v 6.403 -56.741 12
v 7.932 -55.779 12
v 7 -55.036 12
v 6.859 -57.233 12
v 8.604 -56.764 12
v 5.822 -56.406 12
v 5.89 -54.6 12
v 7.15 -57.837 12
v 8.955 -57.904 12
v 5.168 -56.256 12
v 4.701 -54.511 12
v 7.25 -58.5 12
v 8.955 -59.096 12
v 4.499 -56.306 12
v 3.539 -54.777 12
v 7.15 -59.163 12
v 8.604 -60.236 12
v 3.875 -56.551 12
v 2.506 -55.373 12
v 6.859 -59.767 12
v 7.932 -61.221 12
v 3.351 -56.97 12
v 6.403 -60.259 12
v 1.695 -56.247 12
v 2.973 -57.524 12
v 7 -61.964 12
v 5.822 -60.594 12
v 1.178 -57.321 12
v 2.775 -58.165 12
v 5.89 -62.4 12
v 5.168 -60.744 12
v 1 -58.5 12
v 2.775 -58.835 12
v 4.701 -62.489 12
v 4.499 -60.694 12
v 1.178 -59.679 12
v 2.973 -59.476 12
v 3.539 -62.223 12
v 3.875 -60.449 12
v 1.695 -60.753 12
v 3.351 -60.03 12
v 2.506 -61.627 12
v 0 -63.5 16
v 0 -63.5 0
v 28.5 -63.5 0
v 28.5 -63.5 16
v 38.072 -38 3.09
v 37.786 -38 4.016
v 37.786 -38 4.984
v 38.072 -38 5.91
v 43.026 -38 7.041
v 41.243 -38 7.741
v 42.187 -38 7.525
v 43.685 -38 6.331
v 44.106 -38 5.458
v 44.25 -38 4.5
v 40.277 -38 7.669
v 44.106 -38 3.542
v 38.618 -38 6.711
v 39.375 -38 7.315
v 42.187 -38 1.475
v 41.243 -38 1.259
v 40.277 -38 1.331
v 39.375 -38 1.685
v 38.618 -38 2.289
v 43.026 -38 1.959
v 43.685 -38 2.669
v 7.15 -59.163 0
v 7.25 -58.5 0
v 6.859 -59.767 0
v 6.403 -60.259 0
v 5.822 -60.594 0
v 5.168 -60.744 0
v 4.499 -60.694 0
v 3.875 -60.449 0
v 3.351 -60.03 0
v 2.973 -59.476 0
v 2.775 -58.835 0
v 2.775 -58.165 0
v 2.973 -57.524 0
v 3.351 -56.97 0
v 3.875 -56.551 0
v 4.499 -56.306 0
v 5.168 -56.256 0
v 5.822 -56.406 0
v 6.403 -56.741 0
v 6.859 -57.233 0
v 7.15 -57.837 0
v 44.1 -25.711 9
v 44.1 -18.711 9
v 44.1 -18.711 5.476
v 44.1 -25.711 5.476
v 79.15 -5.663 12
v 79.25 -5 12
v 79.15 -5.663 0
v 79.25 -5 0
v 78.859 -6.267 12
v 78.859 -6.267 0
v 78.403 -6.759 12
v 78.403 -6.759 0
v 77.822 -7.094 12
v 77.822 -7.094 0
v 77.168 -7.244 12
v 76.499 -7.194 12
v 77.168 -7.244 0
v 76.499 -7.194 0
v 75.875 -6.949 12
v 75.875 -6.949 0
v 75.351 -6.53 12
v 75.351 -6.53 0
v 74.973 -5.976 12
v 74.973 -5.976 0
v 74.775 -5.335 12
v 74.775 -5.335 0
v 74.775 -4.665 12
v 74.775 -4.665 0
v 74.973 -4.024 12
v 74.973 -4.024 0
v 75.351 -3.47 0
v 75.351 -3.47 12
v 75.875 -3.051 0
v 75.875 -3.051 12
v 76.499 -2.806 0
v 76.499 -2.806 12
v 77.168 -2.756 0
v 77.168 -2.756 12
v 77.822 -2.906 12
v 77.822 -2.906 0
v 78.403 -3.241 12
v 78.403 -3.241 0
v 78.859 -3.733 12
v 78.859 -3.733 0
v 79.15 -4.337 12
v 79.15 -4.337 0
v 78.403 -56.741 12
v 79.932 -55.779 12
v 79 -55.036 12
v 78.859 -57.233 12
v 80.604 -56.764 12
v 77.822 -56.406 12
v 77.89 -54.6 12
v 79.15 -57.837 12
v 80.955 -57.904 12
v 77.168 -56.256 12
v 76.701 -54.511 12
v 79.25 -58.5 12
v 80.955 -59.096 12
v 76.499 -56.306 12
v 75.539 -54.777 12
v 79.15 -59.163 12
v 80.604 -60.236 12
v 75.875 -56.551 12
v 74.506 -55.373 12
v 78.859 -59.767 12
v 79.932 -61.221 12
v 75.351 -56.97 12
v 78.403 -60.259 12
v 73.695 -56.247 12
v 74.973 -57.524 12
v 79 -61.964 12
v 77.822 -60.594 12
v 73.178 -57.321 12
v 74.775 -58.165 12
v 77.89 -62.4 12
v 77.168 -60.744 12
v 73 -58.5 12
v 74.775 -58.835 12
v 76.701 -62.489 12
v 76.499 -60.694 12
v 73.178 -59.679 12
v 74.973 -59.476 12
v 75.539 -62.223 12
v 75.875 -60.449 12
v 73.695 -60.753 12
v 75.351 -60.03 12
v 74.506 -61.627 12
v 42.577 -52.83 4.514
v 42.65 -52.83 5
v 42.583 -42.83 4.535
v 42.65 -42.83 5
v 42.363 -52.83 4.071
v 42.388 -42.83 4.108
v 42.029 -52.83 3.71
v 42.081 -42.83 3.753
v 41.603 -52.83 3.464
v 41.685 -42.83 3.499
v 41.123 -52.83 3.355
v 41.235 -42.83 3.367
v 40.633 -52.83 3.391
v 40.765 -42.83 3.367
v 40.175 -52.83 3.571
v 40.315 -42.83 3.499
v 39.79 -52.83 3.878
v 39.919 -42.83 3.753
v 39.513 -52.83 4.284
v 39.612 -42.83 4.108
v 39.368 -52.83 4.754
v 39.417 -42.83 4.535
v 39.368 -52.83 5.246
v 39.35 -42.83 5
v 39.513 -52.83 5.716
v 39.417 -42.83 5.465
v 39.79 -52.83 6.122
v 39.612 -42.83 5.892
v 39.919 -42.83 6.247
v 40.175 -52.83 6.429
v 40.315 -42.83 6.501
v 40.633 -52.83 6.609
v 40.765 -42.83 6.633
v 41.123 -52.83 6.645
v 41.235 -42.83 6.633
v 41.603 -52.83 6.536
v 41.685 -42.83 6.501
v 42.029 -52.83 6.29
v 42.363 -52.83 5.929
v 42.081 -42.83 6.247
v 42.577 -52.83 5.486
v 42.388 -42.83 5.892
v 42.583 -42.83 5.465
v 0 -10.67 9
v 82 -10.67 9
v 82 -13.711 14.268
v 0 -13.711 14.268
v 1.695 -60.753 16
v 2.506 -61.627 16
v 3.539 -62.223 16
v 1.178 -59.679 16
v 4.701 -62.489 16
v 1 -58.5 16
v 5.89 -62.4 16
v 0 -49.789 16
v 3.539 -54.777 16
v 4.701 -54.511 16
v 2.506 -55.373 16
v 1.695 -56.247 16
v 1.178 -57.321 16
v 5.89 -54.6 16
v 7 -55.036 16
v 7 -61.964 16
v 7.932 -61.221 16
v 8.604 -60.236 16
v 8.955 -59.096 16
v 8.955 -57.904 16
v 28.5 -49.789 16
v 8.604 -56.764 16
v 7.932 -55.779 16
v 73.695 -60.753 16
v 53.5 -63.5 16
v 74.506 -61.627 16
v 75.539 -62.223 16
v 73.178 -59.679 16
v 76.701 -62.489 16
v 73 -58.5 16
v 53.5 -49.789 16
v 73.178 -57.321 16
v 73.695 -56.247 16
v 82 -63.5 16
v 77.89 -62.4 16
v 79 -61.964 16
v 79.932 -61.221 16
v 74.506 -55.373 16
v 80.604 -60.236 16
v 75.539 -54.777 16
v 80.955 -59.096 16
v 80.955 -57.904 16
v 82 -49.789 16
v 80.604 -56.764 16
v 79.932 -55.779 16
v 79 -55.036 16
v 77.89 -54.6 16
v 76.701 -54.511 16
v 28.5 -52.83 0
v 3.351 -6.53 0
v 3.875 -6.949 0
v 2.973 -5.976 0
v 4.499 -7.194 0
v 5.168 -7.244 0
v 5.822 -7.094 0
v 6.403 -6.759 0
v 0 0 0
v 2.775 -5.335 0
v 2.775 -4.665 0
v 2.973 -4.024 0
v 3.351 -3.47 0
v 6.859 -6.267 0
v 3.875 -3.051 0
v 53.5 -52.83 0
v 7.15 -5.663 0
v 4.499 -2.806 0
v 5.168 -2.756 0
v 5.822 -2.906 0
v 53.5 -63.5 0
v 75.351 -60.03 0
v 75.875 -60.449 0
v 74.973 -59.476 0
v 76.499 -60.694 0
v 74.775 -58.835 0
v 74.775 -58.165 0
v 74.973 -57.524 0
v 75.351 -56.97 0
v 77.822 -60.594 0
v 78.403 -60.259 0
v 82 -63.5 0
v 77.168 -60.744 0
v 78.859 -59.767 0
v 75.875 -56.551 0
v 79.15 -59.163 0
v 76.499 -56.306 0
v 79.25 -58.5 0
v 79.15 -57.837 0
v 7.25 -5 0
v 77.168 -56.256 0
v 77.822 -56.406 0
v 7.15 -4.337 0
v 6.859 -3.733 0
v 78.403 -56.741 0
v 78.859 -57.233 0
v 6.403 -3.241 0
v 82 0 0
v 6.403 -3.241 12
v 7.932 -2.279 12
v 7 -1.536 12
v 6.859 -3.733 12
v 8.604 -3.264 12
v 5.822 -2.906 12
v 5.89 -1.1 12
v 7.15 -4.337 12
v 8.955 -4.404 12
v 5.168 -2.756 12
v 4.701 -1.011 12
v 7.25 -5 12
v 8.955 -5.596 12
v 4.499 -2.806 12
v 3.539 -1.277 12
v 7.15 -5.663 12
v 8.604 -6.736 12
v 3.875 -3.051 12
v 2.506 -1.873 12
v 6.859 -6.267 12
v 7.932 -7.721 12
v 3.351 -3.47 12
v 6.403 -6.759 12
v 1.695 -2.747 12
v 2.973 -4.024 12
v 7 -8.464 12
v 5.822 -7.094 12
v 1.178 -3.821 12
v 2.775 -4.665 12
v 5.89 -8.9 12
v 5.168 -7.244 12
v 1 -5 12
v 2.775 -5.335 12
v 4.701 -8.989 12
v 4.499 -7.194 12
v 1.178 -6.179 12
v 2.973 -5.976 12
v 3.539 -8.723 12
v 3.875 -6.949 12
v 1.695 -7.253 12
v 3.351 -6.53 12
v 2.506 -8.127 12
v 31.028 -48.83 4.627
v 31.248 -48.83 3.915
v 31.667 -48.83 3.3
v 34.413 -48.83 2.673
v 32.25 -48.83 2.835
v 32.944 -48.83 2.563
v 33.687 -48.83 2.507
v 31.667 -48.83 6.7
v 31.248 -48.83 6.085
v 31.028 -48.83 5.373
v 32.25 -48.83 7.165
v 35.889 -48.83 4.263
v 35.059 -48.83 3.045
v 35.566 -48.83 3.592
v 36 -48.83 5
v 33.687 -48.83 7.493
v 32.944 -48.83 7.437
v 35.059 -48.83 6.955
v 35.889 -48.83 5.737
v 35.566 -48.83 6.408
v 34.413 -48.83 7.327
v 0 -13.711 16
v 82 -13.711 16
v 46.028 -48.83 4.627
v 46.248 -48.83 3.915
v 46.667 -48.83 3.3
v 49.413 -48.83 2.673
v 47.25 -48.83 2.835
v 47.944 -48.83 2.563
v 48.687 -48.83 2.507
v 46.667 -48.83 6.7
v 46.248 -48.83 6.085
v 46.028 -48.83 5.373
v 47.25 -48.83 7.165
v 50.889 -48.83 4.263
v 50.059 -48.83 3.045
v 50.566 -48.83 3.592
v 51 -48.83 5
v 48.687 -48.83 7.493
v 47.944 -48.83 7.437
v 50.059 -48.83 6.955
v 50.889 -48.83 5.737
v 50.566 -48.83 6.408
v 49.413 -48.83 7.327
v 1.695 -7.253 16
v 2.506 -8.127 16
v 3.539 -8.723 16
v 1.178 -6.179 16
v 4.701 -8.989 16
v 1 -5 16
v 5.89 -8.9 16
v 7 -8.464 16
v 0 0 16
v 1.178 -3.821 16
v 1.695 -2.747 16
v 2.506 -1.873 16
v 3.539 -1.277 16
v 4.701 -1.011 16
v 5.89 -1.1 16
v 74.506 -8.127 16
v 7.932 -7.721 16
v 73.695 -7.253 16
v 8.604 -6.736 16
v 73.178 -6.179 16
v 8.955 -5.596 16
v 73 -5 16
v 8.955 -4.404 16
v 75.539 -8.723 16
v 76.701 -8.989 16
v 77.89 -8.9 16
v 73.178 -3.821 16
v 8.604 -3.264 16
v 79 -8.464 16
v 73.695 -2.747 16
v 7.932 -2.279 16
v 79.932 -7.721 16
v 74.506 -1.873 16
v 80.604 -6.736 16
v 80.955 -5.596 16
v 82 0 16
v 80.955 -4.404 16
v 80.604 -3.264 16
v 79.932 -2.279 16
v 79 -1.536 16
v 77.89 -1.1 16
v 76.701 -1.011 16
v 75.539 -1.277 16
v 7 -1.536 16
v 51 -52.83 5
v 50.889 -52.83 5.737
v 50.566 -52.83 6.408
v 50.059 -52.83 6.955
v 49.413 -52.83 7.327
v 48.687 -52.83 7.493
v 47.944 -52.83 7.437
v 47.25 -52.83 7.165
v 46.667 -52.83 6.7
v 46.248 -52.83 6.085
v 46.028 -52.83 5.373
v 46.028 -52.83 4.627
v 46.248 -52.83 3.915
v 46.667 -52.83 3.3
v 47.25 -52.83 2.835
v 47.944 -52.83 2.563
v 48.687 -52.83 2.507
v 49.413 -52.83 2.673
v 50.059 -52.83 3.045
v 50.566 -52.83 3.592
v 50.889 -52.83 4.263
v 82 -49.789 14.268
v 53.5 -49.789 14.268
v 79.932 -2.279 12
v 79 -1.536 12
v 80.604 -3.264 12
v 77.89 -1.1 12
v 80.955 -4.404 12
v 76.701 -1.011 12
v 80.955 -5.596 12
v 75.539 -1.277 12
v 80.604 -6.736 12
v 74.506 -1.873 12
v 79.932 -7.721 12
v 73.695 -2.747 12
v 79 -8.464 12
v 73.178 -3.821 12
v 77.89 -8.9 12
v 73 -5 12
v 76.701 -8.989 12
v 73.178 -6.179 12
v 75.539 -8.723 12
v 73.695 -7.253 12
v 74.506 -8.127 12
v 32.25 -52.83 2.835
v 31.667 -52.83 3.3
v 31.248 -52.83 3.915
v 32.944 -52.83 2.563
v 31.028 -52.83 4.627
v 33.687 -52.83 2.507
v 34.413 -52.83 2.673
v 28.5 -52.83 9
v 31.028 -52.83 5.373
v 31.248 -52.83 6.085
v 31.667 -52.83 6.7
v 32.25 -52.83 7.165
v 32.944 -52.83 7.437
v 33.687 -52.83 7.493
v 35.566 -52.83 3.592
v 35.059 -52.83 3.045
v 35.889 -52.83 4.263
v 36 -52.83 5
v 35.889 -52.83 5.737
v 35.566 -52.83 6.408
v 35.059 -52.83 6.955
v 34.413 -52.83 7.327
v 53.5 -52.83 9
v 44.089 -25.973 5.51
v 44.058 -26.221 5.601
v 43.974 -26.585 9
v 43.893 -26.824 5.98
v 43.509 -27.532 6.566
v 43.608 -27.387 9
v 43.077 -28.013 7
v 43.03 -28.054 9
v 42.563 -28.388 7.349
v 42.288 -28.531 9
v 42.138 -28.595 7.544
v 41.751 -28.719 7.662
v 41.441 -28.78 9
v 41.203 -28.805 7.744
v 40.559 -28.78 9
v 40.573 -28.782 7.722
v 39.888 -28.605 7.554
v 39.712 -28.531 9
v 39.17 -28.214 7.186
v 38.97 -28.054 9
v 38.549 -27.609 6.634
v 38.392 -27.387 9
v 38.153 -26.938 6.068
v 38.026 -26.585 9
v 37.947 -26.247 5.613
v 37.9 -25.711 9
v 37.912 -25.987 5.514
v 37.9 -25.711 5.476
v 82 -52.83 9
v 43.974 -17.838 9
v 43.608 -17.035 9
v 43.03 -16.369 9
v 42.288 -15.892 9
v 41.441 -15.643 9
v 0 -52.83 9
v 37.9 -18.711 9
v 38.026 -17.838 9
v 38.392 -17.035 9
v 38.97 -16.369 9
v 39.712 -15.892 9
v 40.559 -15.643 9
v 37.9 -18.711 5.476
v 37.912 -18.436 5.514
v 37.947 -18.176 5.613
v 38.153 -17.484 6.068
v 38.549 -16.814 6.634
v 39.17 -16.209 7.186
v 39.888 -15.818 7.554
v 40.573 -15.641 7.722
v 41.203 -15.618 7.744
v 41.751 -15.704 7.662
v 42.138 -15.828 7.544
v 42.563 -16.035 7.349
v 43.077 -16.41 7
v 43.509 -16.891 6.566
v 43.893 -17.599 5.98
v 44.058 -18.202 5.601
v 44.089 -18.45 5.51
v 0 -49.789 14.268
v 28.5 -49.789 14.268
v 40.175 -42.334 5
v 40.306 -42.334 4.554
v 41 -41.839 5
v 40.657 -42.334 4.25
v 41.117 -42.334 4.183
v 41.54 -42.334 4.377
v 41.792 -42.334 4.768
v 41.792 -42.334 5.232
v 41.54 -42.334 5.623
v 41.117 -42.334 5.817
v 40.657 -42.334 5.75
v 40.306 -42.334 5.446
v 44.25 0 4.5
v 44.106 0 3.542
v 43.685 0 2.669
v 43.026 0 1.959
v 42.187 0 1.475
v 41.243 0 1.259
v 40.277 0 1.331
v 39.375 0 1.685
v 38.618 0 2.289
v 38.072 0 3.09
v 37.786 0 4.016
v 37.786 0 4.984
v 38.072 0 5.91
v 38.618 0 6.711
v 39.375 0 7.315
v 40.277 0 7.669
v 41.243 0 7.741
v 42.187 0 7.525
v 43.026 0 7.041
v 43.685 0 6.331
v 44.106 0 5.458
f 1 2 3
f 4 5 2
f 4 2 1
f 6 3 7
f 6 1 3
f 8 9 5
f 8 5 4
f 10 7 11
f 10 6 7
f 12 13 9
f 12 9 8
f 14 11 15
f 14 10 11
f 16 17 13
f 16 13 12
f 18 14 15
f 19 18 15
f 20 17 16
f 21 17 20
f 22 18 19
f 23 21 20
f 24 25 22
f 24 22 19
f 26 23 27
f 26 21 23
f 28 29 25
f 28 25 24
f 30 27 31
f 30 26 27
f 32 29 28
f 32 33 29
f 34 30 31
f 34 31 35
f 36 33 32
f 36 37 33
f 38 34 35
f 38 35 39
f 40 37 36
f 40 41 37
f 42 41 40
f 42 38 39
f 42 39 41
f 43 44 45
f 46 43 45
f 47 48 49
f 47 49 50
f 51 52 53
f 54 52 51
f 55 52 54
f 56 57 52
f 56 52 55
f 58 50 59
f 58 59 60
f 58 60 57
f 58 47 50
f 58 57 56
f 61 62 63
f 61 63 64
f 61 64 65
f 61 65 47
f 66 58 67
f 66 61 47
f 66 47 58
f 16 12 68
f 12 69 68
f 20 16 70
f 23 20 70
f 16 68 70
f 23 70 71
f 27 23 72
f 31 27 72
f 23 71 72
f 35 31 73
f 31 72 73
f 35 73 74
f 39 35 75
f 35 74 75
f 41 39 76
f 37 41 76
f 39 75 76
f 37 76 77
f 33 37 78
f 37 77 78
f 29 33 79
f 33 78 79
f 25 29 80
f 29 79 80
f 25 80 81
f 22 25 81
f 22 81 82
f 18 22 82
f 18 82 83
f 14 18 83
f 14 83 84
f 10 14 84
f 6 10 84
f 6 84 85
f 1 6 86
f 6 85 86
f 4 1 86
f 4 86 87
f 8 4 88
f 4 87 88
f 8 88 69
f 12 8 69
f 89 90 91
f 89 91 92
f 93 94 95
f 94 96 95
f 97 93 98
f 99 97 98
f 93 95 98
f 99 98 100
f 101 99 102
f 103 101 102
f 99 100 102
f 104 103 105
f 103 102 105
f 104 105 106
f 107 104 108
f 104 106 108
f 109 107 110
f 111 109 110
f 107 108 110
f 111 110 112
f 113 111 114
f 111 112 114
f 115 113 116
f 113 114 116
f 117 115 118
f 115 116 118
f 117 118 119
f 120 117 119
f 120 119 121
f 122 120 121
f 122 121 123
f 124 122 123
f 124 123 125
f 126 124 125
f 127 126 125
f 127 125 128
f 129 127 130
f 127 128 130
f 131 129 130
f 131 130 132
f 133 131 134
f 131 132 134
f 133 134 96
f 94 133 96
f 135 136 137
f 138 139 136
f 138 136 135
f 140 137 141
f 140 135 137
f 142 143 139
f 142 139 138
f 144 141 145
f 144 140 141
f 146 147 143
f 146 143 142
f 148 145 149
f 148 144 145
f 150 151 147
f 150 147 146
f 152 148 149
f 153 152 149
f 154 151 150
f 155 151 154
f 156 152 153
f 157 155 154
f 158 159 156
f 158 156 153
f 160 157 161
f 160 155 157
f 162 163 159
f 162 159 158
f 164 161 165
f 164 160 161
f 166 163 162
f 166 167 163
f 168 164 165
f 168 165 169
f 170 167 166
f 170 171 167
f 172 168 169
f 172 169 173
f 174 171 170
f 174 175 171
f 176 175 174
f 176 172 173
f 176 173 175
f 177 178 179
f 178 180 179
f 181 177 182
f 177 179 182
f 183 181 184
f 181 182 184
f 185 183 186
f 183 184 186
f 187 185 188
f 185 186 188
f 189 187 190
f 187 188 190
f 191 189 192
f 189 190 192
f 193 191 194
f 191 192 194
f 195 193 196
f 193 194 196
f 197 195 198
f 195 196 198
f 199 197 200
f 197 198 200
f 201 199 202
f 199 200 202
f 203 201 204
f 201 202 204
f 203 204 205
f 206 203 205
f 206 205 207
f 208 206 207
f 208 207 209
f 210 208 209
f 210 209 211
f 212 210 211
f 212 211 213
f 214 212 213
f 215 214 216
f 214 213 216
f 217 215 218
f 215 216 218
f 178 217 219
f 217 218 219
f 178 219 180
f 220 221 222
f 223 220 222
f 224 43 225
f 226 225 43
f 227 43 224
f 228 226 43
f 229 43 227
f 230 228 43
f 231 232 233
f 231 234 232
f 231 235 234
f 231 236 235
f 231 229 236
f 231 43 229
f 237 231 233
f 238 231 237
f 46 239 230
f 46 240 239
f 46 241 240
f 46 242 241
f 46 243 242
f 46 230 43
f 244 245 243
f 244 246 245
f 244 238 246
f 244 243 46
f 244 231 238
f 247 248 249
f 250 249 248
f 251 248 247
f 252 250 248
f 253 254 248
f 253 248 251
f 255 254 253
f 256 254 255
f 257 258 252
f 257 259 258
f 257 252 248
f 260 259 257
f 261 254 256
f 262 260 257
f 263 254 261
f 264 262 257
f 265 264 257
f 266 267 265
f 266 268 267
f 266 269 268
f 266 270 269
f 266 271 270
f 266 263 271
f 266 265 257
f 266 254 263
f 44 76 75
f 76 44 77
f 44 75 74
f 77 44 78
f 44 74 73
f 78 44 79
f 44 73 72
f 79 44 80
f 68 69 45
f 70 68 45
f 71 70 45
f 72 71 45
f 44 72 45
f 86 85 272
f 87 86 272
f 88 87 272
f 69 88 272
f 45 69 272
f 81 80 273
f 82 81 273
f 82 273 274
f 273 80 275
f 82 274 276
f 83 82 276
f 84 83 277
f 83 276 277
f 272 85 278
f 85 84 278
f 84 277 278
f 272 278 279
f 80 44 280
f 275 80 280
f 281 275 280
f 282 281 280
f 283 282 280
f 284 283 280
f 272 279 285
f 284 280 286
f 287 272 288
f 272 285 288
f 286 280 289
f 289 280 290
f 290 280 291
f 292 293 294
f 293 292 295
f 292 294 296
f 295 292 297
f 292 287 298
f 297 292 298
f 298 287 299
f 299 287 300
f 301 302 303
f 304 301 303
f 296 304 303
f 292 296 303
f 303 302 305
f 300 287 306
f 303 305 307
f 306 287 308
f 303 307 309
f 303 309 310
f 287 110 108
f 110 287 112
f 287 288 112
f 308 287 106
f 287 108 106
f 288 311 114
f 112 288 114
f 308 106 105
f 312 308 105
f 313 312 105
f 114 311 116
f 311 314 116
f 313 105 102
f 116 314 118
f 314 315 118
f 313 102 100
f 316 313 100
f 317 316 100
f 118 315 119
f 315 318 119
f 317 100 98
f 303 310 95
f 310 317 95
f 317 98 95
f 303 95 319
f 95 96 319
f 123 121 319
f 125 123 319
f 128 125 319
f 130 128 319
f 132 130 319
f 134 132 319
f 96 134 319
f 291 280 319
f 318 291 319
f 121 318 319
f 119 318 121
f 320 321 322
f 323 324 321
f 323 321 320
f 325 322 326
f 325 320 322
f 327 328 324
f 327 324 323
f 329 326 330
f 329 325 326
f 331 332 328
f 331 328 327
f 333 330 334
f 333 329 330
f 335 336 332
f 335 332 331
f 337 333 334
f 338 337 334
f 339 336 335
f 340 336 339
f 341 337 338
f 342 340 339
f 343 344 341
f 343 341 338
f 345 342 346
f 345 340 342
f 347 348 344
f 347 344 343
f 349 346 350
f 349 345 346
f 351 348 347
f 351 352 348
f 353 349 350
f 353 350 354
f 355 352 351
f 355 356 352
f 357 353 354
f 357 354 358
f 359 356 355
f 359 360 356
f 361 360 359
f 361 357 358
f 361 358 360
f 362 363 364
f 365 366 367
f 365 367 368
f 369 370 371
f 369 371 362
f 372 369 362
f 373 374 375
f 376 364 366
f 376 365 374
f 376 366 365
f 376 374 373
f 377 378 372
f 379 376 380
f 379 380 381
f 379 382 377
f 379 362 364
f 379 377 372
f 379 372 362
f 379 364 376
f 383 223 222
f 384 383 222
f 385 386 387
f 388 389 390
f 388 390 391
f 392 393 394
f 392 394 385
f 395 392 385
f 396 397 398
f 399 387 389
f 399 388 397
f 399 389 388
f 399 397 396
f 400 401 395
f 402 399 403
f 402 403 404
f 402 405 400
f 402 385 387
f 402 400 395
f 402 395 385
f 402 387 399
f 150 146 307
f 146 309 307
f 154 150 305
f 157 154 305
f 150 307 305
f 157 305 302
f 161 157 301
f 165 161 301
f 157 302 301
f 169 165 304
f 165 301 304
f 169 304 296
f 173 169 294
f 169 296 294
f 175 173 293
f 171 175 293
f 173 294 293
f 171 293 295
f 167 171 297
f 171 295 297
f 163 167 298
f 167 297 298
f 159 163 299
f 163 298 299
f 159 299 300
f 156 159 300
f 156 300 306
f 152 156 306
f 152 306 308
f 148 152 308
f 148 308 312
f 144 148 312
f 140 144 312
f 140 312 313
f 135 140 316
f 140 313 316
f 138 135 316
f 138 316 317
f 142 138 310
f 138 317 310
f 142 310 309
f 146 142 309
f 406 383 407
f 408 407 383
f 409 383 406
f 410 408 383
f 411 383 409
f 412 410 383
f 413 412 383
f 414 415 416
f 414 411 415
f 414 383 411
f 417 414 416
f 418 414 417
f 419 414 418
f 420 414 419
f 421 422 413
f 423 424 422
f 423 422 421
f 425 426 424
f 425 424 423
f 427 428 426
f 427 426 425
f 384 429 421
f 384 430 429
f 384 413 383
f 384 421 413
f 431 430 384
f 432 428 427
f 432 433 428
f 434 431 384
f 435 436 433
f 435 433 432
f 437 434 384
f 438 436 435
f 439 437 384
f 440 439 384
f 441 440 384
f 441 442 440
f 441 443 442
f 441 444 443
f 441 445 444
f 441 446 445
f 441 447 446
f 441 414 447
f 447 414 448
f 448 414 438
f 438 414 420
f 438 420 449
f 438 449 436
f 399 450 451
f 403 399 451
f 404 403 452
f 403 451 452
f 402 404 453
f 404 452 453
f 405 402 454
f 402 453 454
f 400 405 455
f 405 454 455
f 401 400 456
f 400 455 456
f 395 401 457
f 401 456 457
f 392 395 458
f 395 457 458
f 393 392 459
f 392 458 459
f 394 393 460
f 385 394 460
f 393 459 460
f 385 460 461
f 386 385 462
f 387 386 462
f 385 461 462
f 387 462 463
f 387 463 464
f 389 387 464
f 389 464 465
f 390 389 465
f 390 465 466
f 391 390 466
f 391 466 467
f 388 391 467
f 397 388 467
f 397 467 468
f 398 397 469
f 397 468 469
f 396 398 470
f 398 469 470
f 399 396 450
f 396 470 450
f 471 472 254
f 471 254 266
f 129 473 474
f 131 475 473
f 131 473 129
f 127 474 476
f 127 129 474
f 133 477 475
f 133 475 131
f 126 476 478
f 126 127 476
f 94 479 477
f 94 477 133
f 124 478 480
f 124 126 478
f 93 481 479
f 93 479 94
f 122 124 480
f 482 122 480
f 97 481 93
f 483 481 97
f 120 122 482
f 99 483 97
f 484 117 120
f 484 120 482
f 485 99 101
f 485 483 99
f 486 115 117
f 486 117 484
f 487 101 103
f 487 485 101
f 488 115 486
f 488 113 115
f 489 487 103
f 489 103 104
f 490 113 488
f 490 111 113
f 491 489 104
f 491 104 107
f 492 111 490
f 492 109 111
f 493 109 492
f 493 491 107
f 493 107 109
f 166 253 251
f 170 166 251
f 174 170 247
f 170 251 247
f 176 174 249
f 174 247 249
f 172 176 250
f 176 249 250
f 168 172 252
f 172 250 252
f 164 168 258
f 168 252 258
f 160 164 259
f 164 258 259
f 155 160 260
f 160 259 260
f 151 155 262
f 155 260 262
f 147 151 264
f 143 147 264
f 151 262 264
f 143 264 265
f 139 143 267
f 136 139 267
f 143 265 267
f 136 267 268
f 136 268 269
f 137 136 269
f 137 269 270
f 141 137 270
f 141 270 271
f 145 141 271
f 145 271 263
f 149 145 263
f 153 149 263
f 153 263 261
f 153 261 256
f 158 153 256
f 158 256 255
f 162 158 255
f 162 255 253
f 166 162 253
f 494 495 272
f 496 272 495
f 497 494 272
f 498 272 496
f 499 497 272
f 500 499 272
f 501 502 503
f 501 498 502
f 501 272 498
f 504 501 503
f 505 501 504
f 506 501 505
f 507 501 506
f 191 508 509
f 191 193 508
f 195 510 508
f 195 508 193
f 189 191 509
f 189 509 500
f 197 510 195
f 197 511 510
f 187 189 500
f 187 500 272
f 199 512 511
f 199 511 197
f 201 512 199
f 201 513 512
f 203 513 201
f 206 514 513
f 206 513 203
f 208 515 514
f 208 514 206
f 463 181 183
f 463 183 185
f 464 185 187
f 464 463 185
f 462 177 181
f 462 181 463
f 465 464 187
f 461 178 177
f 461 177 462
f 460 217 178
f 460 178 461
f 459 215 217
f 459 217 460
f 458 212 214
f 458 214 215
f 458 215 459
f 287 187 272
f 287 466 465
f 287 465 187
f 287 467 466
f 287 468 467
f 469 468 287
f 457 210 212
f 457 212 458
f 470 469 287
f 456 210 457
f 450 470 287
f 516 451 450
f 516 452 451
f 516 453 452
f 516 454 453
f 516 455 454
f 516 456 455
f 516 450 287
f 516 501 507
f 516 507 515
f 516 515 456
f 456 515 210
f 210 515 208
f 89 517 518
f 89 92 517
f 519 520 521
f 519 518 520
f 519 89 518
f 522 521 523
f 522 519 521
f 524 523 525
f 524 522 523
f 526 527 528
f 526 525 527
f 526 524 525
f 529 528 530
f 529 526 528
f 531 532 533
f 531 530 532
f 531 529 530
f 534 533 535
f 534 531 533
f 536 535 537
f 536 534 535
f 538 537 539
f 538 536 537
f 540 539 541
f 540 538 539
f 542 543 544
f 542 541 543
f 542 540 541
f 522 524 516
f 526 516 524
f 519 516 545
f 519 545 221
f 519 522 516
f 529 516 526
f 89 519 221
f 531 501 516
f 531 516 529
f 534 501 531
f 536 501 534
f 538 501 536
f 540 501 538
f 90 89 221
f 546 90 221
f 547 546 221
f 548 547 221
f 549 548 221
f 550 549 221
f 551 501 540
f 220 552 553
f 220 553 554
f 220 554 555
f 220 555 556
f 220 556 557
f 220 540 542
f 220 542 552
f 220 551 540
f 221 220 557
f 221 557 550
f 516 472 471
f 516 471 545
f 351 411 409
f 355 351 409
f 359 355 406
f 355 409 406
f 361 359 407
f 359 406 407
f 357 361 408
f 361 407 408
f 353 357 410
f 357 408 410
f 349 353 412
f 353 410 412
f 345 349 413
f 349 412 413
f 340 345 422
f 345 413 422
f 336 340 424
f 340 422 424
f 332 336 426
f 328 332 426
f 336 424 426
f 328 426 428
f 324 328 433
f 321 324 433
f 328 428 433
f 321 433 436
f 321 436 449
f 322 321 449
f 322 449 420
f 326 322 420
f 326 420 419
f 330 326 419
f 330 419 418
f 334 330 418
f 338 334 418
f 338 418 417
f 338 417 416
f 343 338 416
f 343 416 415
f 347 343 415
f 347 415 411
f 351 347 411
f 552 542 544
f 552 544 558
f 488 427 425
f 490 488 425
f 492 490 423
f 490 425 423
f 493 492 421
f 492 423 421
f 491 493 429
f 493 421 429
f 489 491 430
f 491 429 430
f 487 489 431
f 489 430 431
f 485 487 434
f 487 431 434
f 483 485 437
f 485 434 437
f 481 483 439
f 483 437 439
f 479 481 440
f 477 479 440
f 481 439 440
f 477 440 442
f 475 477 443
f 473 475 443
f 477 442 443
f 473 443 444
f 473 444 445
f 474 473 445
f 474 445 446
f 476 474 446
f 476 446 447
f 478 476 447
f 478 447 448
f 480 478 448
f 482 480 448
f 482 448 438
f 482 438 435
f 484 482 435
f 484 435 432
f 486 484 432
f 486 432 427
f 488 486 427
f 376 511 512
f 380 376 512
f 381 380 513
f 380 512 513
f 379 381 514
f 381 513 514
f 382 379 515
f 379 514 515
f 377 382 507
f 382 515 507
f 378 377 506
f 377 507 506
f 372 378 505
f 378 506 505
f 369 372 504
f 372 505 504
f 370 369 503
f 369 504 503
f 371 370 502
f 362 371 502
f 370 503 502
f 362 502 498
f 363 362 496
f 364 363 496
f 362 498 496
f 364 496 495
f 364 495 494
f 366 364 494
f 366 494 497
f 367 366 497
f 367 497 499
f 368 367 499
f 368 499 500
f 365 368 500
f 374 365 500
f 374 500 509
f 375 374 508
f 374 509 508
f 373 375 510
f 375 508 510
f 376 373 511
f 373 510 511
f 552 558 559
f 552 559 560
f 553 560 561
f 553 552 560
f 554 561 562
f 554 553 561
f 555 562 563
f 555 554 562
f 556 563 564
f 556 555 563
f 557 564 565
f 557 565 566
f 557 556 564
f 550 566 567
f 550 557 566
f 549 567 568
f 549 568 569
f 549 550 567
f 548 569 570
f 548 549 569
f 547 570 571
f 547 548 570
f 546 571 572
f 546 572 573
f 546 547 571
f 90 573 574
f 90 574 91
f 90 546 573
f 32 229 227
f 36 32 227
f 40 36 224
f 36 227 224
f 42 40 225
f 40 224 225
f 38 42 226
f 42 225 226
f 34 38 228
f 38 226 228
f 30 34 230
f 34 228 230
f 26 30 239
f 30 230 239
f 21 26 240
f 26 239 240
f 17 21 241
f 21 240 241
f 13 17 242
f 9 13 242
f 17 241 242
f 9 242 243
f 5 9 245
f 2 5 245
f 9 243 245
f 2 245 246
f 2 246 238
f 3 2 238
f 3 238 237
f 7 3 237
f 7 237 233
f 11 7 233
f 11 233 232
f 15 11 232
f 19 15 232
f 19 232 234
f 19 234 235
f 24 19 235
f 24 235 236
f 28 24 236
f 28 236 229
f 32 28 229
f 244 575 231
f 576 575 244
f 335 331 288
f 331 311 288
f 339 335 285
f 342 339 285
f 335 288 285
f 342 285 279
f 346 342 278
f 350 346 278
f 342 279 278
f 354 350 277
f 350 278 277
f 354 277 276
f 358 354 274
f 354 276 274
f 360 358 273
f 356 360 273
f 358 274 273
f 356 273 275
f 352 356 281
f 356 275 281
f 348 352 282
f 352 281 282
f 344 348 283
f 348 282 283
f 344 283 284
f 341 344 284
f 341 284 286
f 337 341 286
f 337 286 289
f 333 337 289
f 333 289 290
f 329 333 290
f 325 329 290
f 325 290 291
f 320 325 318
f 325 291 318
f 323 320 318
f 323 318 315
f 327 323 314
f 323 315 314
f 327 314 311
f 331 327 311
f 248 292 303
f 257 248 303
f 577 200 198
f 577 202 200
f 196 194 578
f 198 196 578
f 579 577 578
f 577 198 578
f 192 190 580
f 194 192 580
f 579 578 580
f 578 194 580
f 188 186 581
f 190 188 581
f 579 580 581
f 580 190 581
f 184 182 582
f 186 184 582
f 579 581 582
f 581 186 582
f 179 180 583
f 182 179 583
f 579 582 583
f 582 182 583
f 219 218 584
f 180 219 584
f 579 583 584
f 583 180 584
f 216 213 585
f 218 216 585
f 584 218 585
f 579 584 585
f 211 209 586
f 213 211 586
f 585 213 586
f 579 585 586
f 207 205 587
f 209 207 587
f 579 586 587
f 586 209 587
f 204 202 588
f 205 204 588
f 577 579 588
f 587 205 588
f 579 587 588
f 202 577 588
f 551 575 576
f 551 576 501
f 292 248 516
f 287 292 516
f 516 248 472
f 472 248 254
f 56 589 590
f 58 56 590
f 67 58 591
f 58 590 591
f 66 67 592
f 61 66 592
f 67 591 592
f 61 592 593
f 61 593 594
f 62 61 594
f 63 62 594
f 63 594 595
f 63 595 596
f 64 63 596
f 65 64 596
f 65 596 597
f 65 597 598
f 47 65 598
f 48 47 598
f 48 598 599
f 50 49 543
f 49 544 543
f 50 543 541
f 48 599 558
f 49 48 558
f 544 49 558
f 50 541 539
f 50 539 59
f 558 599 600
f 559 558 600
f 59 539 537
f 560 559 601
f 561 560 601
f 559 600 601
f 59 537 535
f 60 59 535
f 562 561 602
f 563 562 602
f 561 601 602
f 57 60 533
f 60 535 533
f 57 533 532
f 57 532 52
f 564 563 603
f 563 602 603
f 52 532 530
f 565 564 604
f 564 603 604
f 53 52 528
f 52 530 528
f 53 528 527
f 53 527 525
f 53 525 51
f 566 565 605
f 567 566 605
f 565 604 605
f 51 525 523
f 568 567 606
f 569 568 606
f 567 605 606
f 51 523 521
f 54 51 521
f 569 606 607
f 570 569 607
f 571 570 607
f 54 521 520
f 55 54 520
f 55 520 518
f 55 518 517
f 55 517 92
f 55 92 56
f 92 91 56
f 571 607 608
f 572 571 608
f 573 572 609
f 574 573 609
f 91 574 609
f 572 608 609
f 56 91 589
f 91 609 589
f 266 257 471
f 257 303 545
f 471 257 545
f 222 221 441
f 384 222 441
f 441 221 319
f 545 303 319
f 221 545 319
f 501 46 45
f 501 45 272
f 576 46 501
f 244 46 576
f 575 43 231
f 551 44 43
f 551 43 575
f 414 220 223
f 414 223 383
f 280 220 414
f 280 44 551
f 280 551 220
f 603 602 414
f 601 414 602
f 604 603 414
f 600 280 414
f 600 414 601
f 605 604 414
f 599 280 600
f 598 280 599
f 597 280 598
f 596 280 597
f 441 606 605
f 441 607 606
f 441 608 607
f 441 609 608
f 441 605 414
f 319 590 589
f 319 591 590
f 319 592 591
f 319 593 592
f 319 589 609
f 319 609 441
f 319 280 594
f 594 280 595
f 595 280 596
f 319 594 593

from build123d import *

# Parameters (mm, degrees)
SKETCH_1_W                  = 82
SKETCH_1_H                  = 63.5
EXTRUDE_1_DEPTH             = 16
CUT_EXTRUDE_1_DEPTH         = 83
SKETCH_15_W                 = 25
SKETCH_15_H                 = 14.711451884
CUT_EXTRUDE_4_DEPTH         = 7
SKETCH_16_W                 = 25
SKETCH_16_H                 = 10.67
CUT_EXTRUDE_5_DEPTH         = 9
SKETCH_17_R                 = 2.5
CUT_EXTRUDE_6_DEPTH         = 4
M4X0_72_D                   = 3.3
M4X0_72_DEPTH               = 10
M4X0_72_TIP                 = 0.991420021
CUT_EXTRUDE_7_DEPTH         = 4
SKETCH_26_R                 = 3.25
CUT_EXTRUDE_8_DEPTH         = 38
HOLE_WIZARD_M41_D           = 4.5
HOLE_WIZARD_M41_CBORE_D     = 8
HOLE_WIZARD_M41_CBORE_DEPTH = 4
CHAMFER_2_SIZE              = 1
CHAMFER_2_SIZE2             = 2
CHAMFER_2_PART_2_SIZE       = 1
CHAMFER_2_PART_2_SIZE2      = 2
CHAMFER_2_PART_3_SIZE       = 1
CHAMFER_2_PART_3_SIZE2      = 2


with BuildPart() as part:
    # Эскиз1 → Бобышка-Вытянуть1 (new body)
    with BuildSketch(Plane.XY):
        with Locations((41, -31.75)):
            Rectangle(SKETCH_1_W, SKETCH_1_H)
    extrude(amount=EXTRUDE_1_DEPTH)

    # Эскиз2 → Вырез-Вытянуть1 (cut, through all)
    with BuildSketch(Plane.ZY):
        Polygon((9, -10.67), (16, -14.711451884), (16, -48.788548116), (9, -52.83), align=None)
    extrude(amount=-CUT_EXTRUDE_1_DEPTH, mode=Mode.SUBTRACT)

    # Эскиз15 → Вырез-Вытянуть4 (cut)
    with BuildSketch(Plane.XY.offset(16)):
        with Locations((41, -56.144274058)):
            Rectangle(SKETCH_15_W, SKETCH_15_H)
    extrude(amount=-CUT_EXTRUDE_4_DEPTH, mode=Mode.SUBTRACT)

    # Эскиз16 → Вырез-Вытянуть5 (cut)
    with BuildSketch(Plane.XY.offset(9)):
        with Locations((41, -58.165)):
            Rectangle(SKETCH_16_W, SKETCH_16_H)
    extrude(amount=-CUT_EXTRUDE_5_DEPTH, mode=Mode.SUBTRACT)

    # Эскиз17 → Вырез-Вытянуть6 (cut)
    with BuildSketch(Plane.XZ.offset(52.83)):
        with Locations((33.5, 5)):
            Circle(SKETCH_17_R)
        with Locations((48.5, 5)):
            Circle(SKETCH_17_R)
    extrude(amount=-CUT_EXTRUDE_6_DEPTH, mode=Mode.SUBTRACT)

    # Отверстие обработанное метчиком M4x0.72
    with Locations(Plane(origin=(0, -52.83, 0), x_dir=(-1, 0, 0), z_dir=(0, -1, 0))):
        with Locations((-41, -5)):
            Hole(M4X0_72_D / 2, depth=M4X0_72_DEPTH)
            with Locations((0, 0, -(M4X0_72_DEPTH + M4X0_72_TIP / 2))):  # 118° drill point
                Cone(0, M4X0_72_D / 2, M4X0_72_TIP, mode=Mode.SUBTRACT)

    # Эскиз25 → Вырез-Вытянуть7 (cut)
    with BuildSketch(Plane.XY.offset(9)):
        with BuildLine():
            Line((44.1, -18.711451884), (44.1, -25.711451884))
            ThreePointArc((44.1, -25.711451884), (41, -28.811451884), (37.9, -25.711451884))
            Line((37.9, -25.711451884), (37.9, -18.711451884))
            ThreePointArc((37.9, -18.711451884), (41, -15.611451884), (44.1, -18.711451884))
        make_face()
    extrude(amount=-CUT_EXTRUDE_7_DEPTH, mode=Mode.SUBTRACT)

    # Эскиз26 → Вырез-Вытянуть8 (cut)
    with BuildSketch(Plane(origin=(0, 0, 0), x_dir=(1, 0, 0), z_dir=(0, 1, 0))):
        with Locations((41, -4.5)):
            Circle(SKETCH_26_R)
    extrude(amount=-CUT_EXTRUDE_8_DEPTH, mode=Mode.SUBTRACT)

    # Цековка для винта с внутренним шестигранником M41 (through all)
    with Locations(Plane(origin=(30.759227947, 26.793365177, 16), x_dir=(-1, 0, 0), z_dir=(0, 0, 1))):
        with Locations((-46.240772053, 31.793365177), (-46.240772053, 85.293365177), (25.759227947, 85.293365177), (25.759227947, 31.793365177)):
            CounterBoreHole(HOLE_WIZARD_M41_D / 2, HOLE_WIZARD_M41_CBORE_D / 2, HOLE_WIZARD_M41_CBORE_DEPTH)

    # Фаска2
    chamfer_2_edges = [part.edges().sort_by_distance(p)[0] for p in [
        (41, -14.711451884, 16),
    ]]
    chamfer_2_side = [part.faces().sort_by_distance(p)[0] for p in [
        (41, -7.569889145, 16),
    ]]
    chamfer(chamfer_2_edges, length=CHAMFER_2_SIZE, length2=CHAMFER_2_SIZE2, reference=chamfer_2_side[0])

    # Фаска2 part 2
    chamfer_2_part_2_edges = [part.edges().sort_by_distance(p)[0] for p in [
        (67.75, -48.788548116, 16),
    ]]
    chamfer_2_part_2_side = [part.faces().sort_by_distance(p)[0] for p in [
        (66.489994625, -55.823384615, 16),
    ]]
    chamfer(chamfer_2_part_2_edges, length=CHAMFER_2_PART_2_SIZE, length2=CHAMFER_2_PART_2_SIZE2, reference=chamfer_2_part_2_side[0])

    # Фаска2 part 3
    chamfer_2_part_3_edges = [part.edges().sort_by_distance(p)[0] for p in [
        (14.25, -48.788548116, 16),
    ]]
    chamfer_2_part_3_side = [part.faces().sort_by_distance(p)[0] for p in [
        (15.510005375, -55.823384615, 16),
    ]]
    chamfer(chamfer_2_part_3_edges, length=CHAMFER_2_PART_3_SIZE, length2=CHAMFER_2_PART_3_SIZE2, reference=chamfer_2_part_3_side[0])


solid = part.part
